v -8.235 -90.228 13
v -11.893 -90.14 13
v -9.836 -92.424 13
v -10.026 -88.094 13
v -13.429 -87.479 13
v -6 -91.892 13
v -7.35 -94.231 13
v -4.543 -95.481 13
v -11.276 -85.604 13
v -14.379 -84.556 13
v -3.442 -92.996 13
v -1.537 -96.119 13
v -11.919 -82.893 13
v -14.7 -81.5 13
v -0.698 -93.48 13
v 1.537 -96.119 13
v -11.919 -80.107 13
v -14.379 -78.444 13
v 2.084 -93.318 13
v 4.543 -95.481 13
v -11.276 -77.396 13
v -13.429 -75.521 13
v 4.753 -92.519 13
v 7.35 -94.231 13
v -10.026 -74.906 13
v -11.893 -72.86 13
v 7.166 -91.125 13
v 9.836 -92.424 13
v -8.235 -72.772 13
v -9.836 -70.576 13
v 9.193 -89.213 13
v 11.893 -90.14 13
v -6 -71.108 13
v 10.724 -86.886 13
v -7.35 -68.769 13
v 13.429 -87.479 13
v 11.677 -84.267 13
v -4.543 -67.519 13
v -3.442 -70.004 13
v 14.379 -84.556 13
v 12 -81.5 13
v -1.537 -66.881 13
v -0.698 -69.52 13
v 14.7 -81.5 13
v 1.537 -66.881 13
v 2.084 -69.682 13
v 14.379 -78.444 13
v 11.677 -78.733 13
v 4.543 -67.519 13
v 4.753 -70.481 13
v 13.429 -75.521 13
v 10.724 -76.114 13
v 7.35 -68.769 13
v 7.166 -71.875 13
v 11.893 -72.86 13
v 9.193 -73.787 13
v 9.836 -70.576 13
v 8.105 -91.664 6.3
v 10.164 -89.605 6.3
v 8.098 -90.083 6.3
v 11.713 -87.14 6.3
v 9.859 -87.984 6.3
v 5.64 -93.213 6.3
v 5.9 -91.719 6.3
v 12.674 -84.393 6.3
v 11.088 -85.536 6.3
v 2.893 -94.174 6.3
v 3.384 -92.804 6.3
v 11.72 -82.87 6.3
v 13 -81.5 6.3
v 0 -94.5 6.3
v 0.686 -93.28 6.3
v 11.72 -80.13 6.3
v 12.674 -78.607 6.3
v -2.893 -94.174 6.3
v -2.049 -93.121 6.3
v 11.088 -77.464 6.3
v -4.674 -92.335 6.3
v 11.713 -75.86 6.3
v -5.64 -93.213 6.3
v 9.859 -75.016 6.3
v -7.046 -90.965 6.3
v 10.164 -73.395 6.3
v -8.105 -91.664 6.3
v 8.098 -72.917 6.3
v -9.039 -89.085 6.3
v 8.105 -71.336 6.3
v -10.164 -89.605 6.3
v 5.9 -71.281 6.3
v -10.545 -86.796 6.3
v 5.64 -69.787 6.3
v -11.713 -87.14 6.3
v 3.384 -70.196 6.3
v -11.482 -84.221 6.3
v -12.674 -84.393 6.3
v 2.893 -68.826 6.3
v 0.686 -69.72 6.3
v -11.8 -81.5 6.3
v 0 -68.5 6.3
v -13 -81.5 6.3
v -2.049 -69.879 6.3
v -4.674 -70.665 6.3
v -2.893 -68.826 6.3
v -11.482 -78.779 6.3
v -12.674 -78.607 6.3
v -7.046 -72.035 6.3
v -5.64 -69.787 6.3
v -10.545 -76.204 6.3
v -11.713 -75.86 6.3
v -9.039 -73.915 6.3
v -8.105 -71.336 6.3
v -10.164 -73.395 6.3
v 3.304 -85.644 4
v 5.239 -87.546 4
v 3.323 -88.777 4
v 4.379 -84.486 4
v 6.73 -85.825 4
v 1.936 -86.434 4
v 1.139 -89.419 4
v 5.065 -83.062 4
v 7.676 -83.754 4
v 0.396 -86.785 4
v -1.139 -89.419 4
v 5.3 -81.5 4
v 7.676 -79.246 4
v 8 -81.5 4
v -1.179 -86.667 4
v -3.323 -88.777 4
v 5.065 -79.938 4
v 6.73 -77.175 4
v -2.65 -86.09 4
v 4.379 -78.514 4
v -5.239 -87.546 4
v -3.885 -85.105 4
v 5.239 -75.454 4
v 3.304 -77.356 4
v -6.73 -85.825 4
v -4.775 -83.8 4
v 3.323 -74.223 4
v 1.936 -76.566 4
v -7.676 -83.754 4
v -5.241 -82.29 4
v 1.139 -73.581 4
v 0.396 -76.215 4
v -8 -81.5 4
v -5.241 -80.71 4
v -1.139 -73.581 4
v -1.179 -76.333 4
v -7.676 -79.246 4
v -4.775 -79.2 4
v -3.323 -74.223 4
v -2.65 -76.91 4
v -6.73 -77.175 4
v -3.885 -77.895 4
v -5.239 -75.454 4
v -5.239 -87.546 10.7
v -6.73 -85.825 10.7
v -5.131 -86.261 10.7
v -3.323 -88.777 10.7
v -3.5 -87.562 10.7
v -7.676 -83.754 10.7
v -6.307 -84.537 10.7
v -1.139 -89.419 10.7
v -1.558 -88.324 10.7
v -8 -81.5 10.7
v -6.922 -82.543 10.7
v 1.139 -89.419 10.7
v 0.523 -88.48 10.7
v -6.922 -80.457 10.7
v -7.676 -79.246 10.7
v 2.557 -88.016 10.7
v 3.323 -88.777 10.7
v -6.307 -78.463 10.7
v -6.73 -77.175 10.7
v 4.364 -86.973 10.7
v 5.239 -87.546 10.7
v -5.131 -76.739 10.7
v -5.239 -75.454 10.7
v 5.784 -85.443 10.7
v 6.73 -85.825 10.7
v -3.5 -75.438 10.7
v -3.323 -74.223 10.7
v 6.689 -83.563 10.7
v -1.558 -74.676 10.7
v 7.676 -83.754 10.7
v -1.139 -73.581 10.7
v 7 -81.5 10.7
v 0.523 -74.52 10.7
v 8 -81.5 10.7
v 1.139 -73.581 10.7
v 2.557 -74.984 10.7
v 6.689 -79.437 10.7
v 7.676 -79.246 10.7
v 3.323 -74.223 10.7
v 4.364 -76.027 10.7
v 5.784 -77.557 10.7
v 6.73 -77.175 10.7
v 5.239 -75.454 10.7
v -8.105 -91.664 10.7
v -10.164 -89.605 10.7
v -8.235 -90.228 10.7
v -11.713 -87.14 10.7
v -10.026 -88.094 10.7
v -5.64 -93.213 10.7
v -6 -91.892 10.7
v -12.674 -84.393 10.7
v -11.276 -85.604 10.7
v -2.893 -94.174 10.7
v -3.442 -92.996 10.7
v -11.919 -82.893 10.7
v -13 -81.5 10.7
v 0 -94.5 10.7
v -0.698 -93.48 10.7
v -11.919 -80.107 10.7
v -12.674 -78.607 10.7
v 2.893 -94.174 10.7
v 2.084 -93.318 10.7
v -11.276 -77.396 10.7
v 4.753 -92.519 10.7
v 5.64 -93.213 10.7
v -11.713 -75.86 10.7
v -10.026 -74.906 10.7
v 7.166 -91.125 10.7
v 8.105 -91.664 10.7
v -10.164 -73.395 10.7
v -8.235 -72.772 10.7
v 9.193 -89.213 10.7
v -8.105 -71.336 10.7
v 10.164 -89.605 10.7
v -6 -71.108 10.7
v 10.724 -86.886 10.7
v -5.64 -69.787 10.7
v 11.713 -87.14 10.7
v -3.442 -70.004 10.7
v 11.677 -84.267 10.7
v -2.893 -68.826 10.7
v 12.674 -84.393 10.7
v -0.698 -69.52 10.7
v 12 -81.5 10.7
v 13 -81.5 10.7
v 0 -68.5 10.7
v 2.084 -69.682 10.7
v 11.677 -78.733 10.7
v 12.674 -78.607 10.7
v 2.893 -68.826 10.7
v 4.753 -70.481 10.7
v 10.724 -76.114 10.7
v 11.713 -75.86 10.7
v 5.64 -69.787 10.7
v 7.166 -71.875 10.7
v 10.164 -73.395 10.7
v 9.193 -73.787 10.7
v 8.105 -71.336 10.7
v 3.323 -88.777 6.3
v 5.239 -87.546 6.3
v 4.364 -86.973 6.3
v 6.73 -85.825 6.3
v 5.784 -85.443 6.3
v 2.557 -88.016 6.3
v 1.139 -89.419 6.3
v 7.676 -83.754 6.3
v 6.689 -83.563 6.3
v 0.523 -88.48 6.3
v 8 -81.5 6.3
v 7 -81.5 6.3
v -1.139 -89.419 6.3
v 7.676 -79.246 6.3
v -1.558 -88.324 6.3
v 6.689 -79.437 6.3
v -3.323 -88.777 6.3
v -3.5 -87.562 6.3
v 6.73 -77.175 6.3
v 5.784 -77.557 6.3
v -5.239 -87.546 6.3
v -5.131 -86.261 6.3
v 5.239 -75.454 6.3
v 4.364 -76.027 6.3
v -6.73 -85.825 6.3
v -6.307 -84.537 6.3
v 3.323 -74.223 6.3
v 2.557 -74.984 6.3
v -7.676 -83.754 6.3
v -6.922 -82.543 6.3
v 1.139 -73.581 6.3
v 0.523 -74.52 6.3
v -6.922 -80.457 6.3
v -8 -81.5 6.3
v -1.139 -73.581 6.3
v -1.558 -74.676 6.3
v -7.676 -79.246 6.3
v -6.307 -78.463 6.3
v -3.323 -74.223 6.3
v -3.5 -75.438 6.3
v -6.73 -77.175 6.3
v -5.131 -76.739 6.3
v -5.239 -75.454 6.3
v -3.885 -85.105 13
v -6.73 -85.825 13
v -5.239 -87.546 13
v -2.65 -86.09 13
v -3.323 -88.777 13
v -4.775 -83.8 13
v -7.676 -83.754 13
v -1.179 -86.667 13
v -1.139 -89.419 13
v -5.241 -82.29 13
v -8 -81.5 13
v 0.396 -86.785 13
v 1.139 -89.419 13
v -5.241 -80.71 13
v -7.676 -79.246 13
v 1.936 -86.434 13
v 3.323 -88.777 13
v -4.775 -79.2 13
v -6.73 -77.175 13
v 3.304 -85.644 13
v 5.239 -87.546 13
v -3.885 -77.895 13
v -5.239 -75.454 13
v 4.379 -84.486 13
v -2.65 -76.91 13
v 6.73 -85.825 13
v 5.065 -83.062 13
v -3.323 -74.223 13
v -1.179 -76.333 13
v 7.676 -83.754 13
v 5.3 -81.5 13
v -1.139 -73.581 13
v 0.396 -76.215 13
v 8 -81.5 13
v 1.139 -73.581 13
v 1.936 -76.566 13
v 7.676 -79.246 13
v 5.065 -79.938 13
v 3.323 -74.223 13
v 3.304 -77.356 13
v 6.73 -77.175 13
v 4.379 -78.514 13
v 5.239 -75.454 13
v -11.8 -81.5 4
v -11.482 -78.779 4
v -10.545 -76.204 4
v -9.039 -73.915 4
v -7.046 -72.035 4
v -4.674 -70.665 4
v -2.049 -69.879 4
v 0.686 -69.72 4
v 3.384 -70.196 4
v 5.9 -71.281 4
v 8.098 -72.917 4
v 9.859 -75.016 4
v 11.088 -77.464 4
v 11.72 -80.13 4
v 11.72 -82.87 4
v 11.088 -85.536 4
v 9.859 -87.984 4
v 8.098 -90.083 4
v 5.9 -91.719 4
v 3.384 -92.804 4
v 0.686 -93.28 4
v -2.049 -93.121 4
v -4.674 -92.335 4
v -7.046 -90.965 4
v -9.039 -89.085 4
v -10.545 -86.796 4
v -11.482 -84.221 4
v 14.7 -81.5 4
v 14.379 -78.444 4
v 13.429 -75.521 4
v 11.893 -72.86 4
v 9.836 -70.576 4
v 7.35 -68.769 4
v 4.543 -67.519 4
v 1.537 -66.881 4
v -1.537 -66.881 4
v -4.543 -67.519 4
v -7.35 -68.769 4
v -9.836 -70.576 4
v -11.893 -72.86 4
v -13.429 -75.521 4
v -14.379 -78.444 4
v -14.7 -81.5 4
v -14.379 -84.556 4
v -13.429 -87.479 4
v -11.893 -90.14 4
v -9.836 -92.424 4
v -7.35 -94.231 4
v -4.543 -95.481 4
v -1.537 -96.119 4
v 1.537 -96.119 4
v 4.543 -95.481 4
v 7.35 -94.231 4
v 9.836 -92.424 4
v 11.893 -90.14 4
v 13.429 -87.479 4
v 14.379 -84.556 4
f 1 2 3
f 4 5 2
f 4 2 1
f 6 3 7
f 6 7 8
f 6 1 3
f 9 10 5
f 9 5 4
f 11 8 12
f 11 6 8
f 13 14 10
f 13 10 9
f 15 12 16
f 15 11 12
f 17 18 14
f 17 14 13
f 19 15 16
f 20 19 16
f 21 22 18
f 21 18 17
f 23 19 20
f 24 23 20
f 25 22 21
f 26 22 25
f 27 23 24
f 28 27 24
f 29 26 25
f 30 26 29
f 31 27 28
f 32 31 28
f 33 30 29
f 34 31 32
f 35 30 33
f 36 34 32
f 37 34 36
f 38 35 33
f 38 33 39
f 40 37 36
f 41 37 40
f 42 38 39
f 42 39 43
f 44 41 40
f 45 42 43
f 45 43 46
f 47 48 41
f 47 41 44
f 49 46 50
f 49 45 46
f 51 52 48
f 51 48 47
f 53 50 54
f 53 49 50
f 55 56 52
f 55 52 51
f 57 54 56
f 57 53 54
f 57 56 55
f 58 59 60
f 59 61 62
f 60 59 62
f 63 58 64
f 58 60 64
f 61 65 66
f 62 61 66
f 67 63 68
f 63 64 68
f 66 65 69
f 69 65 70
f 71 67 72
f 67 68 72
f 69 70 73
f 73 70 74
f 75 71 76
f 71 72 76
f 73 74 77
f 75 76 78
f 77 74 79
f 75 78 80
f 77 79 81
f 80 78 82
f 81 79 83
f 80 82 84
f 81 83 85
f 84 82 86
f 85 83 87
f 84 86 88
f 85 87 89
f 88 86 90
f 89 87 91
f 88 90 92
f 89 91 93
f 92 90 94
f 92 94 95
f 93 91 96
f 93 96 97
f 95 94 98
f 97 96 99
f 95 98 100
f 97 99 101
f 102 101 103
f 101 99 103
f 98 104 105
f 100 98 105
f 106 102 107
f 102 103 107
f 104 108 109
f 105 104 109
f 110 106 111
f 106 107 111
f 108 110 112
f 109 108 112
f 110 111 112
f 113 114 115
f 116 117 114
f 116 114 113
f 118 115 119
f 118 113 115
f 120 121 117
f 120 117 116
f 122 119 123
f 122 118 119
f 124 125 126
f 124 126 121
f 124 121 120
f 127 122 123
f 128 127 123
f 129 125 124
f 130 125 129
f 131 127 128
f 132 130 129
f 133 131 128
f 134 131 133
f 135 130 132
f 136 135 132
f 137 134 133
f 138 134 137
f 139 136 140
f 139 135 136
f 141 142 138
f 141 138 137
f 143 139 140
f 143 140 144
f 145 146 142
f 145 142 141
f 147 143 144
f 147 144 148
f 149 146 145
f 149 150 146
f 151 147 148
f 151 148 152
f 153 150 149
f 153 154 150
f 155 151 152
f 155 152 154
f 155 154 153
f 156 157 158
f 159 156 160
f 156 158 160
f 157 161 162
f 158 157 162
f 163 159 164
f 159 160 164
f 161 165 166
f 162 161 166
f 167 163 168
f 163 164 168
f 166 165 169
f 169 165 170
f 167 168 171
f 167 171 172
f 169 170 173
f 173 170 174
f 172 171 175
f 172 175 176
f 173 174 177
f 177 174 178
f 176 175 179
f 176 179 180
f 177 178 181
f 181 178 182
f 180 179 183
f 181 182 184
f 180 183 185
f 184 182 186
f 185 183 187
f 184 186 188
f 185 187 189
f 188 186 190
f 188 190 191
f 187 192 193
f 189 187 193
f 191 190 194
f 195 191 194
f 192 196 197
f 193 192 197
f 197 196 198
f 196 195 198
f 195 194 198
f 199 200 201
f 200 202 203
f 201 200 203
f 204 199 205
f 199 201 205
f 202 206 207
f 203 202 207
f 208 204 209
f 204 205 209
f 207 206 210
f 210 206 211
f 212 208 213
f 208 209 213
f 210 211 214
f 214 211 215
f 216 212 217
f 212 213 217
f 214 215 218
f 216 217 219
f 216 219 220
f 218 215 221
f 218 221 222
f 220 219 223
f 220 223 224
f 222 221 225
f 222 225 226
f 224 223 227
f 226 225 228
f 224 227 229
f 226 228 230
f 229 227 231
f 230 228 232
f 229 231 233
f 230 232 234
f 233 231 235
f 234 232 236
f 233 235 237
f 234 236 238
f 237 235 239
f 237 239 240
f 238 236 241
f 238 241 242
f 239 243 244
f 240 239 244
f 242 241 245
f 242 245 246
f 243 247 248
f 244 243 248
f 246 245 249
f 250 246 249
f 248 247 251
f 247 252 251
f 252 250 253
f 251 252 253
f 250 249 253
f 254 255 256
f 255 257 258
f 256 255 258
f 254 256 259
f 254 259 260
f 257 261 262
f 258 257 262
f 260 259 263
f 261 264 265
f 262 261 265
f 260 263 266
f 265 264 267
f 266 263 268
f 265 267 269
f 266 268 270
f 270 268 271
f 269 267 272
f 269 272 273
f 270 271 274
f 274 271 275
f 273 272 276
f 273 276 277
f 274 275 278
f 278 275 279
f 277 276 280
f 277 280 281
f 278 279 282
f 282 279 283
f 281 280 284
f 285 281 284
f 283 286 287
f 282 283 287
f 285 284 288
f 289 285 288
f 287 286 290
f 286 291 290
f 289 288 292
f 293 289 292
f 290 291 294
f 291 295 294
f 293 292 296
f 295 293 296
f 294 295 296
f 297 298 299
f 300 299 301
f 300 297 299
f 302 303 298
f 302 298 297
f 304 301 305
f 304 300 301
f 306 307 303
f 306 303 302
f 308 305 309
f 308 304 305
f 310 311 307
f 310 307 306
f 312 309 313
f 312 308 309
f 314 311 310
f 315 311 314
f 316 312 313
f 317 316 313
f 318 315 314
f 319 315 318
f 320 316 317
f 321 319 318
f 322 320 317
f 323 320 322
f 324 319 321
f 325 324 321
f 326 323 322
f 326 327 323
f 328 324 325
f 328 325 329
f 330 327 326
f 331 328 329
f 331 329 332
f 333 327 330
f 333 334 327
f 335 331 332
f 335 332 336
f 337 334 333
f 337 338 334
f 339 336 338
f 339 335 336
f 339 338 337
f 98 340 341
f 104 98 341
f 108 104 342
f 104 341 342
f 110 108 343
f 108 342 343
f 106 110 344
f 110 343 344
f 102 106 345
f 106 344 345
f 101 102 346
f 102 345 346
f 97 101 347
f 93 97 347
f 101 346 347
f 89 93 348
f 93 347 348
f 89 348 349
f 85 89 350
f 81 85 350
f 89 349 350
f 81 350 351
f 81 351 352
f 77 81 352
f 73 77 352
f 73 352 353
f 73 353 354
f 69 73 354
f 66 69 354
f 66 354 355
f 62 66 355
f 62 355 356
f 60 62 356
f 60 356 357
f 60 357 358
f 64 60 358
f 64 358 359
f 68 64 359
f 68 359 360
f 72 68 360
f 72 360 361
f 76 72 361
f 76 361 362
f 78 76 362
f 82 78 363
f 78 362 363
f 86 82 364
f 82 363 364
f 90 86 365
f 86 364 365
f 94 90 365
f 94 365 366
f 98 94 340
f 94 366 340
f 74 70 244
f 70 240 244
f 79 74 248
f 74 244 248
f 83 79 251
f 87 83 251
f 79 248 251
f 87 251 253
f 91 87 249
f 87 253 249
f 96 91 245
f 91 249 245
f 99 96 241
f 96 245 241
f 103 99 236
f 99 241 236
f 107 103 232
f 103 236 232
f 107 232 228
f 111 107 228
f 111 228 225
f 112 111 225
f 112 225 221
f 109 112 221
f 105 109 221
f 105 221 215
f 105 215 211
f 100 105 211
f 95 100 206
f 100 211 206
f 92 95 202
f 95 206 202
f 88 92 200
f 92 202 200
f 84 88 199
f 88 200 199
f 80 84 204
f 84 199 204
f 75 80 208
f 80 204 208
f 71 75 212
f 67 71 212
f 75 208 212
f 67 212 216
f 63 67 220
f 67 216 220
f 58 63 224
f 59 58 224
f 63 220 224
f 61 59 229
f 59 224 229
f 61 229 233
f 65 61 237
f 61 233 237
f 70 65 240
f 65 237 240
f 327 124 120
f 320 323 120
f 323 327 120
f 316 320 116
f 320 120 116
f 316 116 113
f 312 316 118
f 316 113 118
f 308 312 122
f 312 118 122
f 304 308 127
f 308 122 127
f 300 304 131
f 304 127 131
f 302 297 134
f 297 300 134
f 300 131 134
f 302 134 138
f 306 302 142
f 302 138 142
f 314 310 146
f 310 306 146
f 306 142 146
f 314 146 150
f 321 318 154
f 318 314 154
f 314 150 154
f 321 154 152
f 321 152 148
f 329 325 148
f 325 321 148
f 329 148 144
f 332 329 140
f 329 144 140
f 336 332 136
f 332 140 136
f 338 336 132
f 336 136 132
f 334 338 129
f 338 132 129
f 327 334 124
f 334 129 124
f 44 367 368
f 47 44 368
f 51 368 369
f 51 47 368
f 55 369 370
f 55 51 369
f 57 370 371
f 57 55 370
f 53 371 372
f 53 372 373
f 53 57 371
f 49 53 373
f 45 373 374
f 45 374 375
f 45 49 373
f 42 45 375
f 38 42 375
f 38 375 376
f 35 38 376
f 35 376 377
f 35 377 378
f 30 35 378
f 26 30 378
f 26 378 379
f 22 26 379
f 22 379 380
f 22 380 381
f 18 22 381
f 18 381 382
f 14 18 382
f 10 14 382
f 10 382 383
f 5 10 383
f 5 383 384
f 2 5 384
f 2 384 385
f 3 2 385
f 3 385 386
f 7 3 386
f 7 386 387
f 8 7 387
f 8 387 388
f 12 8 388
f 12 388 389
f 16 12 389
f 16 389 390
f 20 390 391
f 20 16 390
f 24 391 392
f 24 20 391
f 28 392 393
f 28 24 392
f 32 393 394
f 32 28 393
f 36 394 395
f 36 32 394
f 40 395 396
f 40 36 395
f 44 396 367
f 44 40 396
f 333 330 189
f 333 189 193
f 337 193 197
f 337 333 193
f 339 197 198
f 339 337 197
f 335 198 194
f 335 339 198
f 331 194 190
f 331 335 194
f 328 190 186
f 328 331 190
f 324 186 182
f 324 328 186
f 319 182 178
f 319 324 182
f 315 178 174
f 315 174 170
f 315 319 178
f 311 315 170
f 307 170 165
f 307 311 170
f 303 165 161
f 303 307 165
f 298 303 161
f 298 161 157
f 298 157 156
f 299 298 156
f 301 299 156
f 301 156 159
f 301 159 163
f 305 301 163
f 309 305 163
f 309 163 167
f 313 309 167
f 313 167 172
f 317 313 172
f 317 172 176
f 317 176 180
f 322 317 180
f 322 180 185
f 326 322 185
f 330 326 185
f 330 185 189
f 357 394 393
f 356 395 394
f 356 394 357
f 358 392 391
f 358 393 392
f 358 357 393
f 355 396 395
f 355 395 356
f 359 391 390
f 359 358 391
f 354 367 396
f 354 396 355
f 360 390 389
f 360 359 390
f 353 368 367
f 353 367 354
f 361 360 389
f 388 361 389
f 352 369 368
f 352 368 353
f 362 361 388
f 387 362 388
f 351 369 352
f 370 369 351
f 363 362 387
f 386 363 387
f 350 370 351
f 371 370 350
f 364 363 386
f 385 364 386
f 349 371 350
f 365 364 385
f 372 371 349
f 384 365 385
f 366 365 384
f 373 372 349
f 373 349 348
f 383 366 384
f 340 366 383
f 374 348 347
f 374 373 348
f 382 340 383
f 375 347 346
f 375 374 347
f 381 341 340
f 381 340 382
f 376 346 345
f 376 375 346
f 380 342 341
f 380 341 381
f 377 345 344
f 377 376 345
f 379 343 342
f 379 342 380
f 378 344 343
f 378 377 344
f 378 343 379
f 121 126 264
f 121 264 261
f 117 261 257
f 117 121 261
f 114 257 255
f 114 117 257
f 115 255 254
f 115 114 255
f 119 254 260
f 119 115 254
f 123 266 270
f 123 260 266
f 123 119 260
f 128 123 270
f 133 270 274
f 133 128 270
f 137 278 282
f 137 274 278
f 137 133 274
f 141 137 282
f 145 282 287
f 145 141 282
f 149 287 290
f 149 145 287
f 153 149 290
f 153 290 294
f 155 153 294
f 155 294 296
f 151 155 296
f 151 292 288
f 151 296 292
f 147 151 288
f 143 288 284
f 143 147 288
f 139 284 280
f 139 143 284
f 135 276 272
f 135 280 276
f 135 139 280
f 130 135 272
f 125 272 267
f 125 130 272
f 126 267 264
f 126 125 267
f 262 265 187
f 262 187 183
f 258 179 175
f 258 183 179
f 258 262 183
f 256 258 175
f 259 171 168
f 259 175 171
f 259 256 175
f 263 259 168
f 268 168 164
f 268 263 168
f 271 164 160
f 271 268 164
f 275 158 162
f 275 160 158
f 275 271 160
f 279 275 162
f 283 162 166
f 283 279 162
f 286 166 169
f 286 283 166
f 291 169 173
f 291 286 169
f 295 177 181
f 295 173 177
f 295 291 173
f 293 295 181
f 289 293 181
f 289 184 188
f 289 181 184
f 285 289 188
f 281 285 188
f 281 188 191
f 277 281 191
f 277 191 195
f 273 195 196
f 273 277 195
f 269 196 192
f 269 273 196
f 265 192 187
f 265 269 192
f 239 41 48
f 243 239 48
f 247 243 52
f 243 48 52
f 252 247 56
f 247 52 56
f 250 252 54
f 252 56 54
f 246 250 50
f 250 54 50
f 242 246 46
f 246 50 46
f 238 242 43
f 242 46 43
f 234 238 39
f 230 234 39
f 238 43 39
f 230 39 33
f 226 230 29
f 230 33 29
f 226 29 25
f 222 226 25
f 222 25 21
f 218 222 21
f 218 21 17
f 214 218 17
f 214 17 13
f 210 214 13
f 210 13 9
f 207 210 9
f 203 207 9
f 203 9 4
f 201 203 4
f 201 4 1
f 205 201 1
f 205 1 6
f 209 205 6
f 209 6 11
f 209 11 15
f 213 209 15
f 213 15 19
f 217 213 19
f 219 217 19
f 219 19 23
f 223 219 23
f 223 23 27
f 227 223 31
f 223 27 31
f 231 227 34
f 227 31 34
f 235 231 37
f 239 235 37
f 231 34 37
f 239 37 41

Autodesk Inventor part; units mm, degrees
ref_plane "YZ Plane" through (0, 0, 0) normal (1, 0, 0) x (0, 1, 0)
ref_plane "XZ Plane" through (0, 0, 0) normal (0, 1, 0) x (-1, 0, 0)
ref_plane "XY Plane" through (0, 0, 0) normal (0, 0, 1) x (1, 0, 0)
ref_plane "작업 평면1" through (0, -41, 8.5) normal (0, 0, 1) x (1, 0, 0)
sketch "스케치1" plane through (0, -41, 8.5) normal (0, 0, 1) x (1, 0, 0)
  circle A0 centre (0, -40.5) radius 15 projected
  circle A1 centre (0, -40.5) radius 5 projected
  circle A2 centre (0, -40.5) radius 14.7
  circle A3 centre (0, -40.5) radius 5.3
  circle A4 centre (0, -40.5) radius 13
  circle A5 centre (0, -40.5) radius 7
  point P0 (0, 41)
  dimension "d0" = 0.3
  dimension "d1" = 0.3
  dimension "d2" = 1.7
  dimension "d3" = 1.7
extrude "돌출1" add sketch "스케치1" along normal mid plane 9 contours A2 | A5
ref_plane "작업 평면2" through (0, -81.5, 8.5) normal (0, 0, 1) x (1, 0, 0)
sketch "스케치3" plane through (0, -81.5, 13) normal (0, 0, 1) x (1, 0, 0)
  circle A0 centre (0, 0) radius 13 projected
  circle A1 centre (0, 0) radius 12
  circle A2 centre (0, 0) radius 7 projected
  circle A3 centre (0, 0) radius 8
  point P0 (0, 81.5)
  dimension "d11" = 1
  dimension "d12" = 1
extrude "돌출2" add sketch "스케치3" against normal blind 2.3
mirror "미러1" about plane through (0, -81.5, 8.5) normal (0, 0, 1) of "돌출2"
sketch "스케치4" plane through (0, 0, 0) normal (1, 0, 0) x (0, 1, 0)
  line L0 (-76.2, 4) -> (-86.8, 4) projected
  line L1 (-86.8, 13) -> (-76.2, 13) projected
  line L2 (-74.5, 6.3) -> (-88.5, 6.3) construction
  line L3 (-88.5, 10.7) -> (-74.5, 10.7) projected
  line L4 (-86.8, 13) -> (-86.8, 4) projected
  line L5 (-76.2, 13) -> (-76.2, 4) projected
  line L6 (-94.5, 10.7) -> (-94.5, 6.3) projected
  line L7 (-66.8, 4) -> (-66.8, 13) projected
  line L8 (-96.2, 4) -> (-96.2, 13) projected
  line L9 (-68.5, 10.7) -> (-68.5, 6.3) projected
  line L10 (-73.5, 13) -> (-89.5, 13) projected
  line L11 (-73.5, 4) -> (-89.5, 4) projected
  line L12 (-89.5, 6.3) -> (-89.5, 4) projected
  line L13 (-89.5, 13) -> (-89.5, 10.7) projected
  line L14 (-68.5, 10.7) -> (-94.5, 10.7) projected
  line L15 (-94.5, 6.3) -> (-68.5, 6.3) projected
  line L16 (-94.5, 10.7) -> (-94.5, 6.3) projected
  line L17 (-89.5, 10.7) -> (-73.5, 10.7) projected
  line L18 (-89.5, 6.3) -> (-73.5, 6.3) projected
  point P0 (0, 0)
  point P1 (-90.4, 10)
  point P2 (-72.6, 10)
  point P3 (-90.4, 7)
  point P4 (-72.6, 7)
  point P5 (-72.6, 9.7)
  point P6 (-90.4, 9.7)
  point P7 (-90.4, 7.3)
  point P8 (-72.6, 7.3)
  point P9 (-89.8, 10)
  point P10 (-73.2, 10)
  point P11 (-89.8, 7)
  point P12 (-73.2, 7)
  dimension "d15" = 5
sketch "스케치5" plane through (0, -81.5, 4) normal (0, 0, -1) x (-1, 0, 0)
  circle A0 centre (0, 0) radius 12 projected
  circle A1 centre (0, 0) radius 11.8
  point P0 (0, 81.5)
  dimension "d16" = 0.2
extrude "돌출3" add sketch "스케치5" against normal blind 2.3
properties part number "SAFRS-P-0033"
